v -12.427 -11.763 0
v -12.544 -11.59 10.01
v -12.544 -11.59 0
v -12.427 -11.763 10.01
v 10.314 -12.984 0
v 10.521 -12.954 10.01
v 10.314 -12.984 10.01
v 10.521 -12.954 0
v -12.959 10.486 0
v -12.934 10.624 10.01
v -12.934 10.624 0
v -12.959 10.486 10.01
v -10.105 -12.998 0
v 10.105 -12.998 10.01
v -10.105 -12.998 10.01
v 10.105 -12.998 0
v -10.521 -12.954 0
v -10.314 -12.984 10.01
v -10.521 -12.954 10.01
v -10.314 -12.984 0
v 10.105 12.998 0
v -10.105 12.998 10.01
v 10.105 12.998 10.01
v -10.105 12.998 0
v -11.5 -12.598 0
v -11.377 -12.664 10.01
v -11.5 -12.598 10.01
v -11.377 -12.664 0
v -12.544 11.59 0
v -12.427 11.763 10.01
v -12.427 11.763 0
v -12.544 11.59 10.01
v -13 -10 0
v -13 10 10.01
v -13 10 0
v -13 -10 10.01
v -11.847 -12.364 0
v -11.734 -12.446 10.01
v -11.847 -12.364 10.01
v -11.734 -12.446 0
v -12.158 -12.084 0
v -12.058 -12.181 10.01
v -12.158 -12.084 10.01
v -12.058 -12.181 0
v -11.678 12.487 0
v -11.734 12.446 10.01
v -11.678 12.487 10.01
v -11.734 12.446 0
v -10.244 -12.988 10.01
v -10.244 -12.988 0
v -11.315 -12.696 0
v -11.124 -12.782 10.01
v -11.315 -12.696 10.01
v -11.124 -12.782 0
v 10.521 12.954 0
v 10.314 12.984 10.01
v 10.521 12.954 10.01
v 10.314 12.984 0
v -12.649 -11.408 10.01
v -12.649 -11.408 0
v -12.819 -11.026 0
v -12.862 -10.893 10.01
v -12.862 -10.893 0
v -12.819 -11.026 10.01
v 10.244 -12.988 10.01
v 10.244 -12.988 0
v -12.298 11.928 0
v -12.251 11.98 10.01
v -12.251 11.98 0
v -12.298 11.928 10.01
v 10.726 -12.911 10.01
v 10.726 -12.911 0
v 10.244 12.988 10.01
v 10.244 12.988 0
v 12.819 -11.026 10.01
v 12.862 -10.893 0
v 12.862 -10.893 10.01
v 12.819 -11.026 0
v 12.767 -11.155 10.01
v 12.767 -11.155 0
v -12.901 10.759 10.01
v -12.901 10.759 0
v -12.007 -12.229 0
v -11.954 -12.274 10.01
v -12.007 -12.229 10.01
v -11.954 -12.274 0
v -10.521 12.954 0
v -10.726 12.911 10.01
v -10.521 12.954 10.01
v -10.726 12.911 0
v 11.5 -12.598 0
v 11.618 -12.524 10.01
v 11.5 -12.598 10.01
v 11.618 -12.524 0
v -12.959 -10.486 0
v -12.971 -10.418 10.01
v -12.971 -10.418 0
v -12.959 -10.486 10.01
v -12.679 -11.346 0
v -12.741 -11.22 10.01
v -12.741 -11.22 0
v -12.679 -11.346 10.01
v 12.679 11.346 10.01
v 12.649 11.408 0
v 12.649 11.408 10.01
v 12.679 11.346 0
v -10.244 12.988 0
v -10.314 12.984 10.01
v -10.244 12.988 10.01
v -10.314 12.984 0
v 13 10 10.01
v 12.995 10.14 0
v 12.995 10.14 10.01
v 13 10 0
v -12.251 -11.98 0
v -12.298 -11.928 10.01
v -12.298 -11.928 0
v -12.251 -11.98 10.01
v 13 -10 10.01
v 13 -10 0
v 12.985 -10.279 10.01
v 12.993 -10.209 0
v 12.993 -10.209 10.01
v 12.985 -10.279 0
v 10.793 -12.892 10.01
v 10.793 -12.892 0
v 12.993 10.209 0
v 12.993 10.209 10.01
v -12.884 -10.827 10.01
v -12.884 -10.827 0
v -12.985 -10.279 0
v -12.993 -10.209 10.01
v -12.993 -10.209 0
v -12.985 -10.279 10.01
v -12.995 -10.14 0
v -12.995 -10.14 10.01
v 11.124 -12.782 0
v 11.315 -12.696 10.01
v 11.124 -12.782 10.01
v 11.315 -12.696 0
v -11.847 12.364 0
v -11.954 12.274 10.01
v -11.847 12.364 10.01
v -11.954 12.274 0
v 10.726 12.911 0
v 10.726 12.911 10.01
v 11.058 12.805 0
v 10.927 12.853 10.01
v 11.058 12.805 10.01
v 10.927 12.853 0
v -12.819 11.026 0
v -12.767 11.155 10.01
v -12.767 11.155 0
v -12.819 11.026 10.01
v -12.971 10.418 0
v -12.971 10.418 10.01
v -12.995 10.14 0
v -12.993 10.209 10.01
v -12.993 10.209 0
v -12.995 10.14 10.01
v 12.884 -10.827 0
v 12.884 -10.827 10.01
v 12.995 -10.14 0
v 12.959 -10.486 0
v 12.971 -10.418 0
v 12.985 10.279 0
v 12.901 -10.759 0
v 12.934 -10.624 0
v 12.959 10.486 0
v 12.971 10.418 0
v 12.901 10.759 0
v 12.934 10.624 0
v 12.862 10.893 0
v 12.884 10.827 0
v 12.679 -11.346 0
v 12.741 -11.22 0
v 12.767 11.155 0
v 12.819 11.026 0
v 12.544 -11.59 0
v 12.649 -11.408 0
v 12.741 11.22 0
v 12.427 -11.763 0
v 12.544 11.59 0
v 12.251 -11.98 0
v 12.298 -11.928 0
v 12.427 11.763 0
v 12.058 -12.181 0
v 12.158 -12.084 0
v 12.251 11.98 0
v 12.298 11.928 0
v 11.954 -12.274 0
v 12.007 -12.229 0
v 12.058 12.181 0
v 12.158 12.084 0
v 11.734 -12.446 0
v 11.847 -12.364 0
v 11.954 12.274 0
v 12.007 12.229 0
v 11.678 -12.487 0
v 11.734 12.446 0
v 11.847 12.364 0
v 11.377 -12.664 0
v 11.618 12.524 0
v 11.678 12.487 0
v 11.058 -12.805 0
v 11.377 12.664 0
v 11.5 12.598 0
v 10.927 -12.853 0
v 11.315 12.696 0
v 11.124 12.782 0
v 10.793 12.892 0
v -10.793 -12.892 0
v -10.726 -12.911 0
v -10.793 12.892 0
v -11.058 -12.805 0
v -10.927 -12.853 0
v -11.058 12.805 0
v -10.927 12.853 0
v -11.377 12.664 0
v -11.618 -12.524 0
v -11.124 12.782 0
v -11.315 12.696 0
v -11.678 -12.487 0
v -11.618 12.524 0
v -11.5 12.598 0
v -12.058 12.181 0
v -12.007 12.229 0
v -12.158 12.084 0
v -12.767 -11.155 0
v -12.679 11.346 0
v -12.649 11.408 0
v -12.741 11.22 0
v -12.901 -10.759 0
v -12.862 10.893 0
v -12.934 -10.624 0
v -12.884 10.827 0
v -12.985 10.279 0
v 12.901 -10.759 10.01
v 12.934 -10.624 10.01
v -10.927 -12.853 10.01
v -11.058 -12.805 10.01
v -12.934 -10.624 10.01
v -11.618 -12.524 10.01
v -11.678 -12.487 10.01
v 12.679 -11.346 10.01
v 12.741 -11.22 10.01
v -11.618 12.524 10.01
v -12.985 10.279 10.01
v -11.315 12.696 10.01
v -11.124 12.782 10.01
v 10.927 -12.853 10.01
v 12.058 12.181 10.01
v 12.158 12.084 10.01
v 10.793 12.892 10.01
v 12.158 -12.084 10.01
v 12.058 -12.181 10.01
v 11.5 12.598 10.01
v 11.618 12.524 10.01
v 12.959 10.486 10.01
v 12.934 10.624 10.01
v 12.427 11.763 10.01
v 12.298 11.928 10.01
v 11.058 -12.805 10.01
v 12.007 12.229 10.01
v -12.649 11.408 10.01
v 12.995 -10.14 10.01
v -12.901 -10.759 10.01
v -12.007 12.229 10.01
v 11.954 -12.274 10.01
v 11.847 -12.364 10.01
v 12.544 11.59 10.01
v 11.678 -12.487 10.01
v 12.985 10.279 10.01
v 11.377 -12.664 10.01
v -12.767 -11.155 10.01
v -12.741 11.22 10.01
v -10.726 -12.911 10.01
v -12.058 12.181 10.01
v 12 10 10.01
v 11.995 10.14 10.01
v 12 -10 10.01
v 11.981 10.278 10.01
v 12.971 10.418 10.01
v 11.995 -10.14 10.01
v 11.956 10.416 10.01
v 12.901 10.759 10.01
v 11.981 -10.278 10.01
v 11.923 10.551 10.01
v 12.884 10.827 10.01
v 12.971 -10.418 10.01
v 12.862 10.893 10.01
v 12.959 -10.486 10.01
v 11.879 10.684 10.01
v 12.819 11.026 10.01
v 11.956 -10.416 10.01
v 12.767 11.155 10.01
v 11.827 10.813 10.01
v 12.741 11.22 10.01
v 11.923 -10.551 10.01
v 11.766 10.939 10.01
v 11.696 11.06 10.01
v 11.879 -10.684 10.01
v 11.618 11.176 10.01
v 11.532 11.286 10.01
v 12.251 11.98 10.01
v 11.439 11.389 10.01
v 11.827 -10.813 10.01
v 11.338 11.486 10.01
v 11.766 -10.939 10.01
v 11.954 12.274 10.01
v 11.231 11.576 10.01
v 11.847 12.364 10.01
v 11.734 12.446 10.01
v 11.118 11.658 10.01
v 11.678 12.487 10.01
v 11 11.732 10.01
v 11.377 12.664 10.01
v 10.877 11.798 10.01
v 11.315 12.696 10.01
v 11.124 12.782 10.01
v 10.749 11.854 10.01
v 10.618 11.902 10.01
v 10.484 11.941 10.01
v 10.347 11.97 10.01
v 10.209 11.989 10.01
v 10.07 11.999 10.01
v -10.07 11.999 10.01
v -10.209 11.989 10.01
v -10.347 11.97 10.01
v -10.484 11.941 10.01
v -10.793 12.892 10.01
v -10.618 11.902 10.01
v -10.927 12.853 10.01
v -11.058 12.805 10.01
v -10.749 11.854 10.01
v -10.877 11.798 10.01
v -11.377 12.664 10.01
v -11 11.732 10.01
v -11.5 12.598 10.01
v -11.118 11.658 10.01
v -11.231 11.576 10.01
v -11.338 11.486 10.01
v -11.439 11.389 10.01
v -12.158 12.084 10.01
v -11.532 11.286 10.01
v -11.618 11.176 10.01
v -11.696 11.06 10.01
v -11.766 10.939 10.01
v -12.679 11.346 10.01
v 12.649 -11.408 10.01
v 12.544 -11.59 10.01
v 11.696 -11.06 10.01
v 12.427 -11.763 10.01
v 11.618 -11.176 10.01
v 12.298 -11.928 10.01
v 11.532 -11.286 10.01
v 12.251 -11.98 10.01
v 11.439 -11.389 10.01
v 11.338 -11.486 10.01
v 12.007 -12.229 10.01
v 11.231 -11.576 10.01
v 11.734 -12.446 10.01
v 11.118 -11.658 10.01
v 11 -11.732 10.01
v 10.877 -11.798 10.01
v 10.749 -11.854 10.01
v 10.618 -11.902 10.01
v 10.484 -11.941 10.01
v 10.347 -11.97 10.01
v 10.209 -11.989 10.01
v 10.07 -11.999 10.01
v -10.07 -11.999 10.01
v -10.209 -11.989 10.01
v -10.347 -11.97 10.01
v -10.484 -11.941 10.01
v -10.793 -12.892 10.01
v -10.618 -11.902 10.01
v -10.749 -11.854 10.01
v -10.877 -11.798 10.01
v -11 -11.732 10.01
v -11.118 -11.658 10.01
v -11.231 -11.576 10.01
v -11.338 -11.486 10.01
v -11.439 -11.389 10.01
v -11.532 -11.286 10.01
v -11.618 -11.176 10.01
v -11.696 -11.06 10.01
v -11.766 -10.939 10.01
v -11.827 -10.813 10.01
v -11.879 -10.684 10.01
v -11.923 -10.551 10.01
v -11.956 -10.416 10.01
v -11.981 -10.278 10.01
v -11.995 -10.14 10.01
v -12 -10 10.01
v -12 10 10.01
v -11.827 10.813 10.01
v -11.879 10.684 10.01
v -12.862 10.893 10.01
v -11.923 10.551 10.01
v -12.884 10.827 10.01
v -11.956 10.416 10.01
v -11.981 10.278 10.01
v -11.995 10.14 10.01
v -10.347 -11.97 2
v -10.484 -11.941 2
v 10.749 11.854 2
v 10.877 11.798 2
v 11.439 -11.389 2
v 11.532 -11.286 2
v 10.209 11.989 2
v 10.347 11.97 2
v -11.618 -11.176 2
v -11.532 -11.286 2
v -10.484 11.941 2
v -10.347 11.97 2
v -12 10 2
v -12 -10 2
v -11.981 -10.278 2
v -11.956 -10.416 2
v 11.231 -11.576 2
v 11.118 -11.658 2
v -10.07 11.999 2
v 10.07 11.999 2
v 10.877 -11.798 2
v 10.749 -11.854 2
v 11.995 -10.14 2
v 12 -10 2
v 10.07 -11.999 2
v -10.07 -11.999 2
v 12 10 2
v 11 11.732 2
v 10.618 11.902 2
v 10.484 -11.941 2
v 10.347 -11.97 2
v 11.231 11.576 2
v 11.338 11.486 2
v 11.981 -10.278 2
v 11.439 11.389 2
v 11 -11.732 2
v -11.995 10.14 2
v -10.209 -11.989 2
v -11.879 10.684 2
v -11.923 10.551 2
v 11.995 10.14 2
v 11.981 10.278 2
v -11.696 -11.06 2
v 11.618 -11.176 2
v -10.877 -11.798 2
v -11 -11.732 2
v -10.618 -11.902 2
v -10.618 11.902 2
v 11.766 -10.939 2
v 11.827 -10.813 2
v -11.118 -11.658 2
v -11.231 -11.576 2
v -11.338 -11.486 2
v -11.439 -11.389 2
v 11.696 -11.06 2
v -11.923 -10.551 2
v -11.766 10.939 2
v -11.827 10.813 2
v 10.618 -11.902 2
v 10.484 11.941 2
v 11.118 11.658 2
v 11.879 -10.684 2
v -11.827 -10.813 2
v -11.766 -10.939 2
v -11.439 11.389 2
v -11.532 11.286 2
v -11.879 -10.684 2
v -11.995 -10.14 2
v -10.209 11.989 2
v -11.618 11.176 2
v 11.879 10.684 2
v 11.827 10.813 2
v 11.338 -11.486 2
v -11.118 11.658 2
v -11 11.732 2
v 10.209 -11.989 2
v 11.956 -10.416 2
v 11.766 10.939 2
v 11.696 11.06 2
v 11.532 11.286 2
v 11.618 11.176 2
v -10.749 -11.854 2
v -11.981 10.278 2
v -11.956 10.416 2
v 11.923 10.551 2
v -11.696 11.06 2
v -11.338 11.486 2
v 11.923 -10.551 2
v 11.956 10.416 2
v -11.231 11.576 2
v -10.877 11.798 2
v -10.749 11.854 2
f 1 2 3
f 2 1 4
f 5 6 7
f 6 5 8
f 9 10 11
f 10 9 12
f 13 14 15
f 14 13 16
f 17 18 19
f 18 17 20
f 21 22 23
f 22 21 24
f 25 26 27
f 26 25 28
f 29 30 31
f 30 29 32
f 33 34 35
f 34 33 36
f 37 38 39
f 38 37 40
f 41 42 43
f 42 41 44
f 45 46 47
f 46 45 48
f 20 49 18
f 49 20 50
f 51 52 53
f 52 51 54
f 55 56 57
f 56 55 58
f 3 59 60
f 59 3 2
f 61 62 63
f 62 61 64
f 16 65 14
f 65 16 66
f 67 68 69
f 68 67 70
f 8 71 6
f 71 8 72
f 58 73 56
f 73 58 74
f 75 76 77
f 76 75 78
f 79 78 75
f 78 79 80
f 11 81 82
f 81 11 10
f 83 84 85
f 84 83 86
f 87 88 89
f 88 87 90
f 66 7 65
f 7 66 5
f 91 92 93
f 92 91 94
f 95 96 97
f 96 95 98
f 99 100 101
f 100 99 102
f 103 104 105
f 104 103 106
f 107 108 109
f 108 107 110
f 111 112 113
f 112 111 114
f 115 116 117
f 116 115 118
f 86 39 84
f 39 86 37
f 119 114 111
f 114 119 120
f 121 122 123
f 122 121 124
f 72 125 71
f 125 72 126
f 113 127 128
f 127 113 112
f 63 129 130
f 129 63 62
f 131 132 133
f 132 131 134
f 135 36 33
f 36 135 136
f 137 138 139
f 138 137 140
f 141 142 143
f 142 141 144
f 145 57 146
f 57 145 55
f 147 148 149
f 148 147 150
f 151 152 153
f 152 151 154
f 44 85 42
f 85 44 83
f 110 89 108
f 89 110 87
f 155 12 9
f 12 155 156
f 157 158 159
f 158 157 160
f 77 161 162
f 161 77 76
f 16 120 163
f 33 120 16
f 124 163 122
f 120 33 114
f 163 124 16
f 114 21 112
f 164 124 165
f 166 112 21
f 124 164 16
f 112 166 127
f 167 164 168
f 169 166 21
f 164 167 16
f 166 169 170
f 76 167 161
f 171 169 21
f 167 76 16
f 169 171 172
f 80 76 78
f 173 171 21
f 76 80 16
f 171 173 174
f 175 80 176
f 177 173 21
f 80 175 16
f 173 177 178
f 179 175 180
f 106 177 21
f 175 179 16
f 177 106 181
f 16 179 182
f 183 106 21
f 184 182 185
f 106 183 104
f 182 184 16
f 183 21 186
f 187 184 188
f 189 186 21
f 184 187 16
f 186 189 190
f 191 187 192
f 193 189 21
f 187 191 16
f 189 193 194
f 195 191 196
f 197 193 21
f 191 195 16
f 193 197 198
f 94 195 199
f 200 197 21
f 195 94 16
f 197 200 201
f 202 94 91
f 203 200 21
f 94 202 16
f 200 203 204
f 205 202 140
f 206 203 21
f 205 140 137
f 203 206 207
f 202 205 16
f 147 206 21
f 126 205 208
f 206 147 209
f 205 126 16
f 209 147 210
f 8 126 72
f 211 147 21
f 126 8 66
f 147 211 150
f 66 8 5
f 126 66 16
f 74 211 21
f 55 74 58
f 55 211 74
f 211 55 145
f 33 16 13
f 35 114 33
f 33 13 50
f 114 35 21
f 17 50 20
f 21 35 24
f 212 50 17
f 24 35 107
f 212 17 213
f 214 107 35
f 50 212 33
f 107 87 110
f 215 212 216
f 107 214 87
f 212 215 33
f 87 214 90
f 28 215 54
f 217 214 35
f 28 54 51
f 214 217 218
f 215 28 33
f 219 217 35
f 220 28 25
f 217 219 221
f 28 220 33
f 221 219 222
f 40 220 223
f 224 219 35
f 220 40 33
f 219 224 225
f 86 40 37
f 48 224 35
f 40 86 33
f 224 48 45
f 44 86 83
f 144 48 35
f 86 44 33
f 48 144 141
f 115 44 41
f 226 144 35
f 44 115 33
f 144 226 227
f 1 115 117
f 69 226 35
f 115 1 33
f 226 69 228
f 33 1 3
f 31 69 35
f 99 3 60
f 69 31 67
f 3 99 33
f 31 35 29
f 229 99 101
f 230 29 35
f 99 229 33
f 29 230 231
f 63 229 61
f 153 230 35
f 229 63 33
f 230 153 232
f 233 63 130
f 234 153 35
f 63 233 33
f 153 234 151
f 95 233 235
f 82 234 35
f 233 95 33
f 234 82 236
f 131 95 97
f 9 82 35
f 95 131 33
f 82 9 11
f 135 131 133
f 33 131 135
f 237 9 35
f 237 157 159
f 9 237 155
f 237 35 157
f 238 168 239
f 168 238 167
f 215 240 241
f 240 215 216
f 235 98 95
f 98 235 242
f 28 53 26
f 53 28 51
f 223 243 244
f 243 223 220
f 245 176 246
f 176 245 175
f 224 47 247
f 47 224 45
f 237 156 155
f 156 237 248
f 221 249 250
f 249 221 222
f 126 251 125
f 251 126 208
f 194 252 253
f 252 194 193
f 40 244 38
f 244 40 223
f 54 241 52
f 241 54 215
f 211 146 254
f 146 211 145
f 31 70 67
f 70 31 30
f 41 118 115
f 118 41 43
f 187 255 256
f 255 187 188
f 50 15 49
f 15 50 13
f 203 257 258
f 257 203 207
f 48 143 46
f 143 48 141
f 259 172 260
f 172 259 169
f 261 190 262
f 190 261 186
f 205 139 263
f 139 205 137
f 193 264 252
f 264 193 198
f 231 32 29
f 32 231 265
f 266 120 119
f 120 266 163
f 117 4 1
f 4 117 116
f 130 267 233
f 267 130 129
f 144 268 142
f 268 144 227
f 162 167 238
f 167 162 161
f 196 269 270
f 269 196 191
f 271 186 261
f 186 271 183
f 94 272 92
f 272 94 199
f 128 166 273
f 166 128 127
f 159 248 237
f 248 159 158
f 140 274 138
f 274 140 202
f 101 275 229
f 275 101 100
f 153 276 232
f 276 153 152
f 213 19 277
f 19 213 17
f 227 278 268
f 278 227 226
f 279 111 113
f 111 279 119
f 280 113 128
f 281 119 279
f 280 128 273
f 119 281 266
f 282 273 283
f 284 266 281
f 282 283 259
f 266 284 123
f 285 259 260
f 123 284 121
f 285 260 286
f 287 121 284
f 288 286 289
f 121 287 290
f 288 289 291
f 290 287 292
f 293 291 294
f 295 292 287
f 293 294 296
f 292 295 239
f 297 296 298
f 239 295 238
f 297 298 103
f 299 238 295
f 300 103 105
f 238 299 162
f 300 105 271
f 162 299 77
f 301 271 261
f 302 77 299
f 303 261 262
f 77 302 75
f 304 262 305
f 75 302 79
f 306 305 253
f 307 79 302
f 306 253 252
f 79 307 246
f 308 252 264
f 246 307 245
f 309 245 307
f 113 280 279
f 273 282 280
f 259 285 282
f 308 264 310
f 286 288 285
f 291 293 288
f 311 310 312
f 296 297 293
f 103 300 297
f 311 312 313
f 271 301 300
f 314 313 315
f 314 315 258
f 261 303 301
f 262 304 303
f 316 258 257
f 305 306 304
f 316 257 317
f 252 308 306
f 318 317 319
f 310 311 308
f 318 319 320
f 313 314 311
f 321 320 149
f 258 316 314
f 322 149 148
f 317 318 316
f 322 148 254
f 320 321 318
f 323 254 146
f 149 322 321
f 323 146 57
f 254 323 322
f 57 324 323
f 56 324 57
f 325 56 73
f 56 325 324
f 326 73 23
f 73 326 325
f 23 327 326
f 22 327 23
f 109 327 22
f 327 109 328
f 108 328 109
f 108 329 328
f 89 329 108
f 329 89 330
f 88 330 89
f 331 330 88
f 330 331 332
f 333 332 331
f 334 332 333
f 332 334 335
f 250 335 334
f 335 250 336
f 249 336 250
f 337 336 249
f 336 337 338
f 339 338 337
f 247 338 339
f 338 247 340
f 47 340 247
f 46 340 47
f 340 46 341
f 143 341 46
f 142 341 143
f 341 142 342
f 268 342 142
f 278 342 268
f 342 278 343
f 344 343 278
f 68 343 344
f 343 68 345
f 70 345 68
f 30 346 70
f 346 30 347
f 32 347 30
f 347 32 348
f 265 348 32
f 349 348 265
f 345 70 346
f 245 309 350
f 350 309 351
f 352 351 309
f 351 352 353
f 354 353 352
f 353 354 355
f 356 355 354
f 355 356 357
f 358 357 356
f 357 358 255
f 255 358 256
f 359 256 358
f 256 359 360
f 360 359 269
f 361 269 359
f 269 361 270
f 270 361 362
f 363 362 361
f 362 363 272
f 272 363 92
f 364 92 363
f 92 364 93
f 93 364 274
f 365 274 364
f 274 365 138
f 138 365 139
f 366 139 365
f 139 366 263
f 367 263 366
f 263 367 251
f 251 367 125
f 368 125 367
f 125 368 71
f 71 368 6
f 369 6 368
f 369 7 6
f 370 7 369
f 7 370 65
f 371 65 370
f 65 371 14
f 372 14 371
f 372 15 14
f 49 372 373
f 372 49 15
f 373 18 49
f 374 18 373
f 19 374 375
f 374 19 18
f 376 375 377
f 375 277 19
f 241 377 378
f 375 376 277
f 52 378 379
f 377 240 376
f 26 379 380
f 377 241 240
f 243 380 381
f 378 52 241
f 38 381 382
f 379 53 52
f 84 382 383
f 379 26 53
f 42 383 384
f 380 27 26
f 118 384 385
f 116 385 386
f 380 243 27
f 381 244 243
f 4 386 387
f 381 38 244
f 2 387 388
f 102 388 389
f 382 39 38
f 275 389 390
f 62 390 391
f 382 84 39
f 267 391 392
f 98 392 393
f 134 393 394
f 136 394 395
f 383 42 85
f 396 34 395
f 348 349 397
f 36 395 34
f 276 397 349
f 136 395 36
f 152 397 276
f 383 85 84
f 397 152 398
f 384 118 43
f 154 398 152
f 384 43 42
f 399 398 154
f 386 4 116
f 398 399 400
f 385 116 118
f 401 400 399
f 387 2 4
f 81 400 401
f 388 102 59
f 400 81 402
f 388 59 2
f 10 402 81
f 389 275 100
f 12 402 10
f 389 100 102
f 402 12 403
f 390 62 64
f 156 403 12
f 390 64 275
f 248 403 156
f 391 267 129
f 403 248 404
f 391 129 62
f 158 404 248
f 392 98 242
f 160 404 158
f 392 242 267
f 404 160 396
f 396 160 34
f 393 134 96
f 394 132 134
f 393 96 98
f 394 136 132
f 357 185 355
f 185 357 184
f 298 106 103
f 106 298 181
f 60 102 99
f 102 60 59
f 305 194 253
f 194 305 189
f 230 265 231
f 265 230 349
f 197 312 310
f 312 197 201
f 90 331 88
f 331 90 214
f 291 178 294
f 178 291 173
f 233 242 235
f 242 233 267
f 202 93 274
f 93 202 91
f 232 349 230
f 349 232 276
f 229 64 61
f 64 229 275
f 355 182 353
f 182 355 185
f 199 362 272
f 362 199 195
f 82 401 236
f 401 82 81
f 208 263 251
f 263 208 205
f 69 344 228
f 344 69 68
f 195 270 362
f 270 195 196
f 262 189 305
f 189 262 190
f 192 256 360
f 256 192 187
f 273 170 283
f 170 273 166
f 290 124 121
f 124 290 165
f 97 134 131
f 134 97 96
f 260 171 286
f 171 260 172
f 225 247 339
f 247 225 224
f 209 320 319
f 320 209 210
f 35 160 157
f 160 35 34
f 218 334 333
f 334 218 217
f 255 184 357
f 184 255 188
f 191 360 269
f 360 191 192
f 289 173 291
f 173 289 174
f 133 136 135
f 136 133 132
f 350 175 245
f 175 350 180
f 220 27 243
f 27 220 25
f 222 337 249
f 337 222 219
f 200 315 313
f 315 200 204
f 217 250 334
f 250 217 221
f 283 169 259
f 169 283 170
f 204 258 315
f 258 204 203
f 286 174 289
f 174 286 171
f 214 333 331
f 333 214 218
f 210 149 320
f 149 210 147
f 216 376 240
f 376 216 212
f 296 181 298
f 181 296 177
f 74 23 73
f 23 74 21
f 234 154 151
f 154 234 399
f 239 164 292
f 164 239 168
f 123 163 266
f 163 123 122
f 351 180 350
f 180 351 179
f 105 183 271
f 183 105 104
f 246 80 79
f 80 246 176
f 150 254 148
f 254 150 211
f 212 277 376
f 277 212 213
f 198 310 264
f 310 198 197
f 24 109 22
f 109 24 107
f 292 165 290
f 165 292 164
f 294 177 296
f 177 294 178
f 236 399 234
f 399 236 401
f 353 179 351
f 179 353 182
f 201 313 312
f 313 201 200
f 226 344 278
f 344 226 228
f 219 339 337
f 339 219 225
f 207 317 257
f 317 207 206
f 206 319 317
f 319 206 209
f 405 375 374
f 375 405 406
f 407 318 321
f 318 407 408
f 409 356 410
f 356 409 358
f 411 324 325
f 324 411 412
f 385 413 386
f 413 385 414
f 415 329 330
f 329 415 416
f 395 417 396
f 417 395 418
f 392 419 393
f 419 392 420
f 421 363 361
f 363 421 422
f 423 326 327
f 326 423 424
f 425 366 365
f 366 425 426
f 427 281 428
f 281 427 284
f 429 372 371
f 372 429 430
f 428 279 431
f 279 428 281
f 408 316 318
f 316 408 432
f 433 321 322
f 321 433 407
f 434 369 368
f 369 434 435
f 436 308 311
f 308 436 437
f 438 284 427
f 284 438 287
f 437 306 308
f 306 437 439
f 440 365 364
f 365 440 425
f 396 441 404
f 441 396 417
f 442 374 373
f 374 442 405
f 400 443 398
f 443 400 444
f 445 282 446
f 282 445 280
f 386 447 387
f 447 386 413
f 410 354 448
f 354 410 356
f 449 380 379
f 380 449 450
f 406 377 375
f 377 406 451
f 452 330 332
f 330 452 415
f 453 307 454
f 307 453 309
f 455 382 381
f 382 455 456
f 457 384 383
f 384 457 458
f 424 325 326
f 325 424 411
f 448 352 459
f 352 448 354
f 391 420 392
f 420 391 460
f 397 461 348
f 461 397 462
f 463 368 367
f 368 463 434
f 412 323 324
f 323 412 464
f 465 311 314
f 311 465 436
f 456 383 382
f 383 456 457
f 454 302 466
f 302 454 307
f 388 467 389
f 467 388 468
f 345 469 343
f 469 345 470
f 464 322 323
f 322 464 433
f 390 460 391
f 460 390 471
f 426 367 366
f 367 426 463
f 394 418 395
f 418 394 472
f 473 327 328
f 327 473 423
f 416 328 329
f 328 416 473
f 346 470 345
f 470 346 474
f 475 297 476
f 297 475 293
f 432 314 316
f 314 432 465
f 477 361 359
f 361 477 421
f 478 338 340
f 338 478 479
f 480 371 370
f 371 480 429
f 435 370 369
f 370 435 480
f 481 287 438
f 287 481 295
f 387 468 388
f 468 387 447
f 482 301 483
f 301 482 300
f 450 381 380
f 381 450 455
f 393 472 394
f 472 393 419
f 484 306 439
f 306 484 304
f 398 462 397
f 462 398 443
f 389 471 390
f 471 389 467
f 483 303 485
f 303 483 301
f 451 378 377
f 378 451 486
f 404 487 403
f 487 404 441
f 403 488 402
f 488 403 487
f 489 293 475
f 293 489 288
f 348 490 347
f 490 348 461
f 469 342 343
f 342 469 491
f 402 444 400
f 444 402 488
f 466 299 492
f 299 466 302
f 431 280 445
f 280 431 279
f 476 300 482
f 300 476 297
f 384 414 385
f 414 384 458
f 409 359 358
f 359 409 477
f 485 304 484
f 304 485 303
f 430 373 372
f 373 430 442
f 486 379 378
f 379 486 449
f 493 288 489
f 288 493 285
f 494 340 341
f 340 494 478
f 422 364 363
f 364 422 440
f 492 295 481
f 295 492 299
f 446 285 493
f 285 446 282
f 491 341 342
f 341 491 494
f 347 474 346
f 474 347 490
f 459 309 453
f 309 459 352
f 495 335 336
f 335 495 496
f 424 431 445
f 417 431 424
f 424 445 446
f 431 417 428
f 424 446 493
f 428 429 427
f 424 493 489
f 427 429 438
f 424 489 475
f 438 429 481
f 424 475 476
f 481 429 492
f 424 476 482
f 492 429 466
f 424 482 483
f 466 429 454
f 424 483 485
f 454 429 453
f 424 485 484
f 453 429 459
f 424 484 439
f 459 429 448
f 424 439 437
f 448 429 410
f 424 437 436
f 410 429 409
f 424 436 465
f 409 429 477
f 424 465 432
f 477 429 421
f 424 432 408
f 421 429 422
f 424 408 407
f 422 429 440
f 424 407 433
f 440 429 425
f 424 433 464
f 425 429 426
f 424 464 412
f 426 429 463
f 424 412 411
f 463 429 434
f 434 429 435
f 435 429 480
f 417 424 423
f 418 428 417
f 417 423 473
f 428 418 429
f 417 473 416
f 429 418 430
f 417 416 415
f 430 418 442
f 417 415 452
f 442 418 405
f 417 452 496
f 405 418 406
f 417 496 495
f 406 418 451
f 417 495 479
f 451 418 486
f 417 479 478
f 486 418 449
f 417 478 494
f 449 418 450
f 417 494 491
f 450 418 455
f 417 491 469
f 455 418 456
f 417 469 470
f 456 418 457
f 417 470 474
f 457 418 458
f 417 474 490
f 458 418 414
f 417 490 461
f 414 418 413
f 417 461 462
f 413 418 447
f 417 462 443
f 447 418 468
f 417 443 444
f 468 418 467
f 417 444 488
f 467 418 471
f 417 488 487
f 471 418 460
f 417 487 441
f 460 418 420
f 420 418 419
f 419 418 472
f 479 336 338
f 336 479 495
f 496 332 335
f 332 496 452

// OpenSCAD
$fn=90;
e=0.01;

module rbox(x, y, z, r=4) {
  hull() {
    for (t = [[-x/2,-y/2],[-x/2,y/2],[x/2,-y/2],[x/2,y/2]]) {
      translate(t) cylinder(r=r/2, h=z);
    }
  }
}

module open_box(wall=2) {
  difference() {
    minkowski() {
      rbox(20, 20, 10);
      cylinder(r=wall/2, h=e);
    }
    translate([0, 0, 2]) rbox(20, 20, 10);
  }
}

open_box();
